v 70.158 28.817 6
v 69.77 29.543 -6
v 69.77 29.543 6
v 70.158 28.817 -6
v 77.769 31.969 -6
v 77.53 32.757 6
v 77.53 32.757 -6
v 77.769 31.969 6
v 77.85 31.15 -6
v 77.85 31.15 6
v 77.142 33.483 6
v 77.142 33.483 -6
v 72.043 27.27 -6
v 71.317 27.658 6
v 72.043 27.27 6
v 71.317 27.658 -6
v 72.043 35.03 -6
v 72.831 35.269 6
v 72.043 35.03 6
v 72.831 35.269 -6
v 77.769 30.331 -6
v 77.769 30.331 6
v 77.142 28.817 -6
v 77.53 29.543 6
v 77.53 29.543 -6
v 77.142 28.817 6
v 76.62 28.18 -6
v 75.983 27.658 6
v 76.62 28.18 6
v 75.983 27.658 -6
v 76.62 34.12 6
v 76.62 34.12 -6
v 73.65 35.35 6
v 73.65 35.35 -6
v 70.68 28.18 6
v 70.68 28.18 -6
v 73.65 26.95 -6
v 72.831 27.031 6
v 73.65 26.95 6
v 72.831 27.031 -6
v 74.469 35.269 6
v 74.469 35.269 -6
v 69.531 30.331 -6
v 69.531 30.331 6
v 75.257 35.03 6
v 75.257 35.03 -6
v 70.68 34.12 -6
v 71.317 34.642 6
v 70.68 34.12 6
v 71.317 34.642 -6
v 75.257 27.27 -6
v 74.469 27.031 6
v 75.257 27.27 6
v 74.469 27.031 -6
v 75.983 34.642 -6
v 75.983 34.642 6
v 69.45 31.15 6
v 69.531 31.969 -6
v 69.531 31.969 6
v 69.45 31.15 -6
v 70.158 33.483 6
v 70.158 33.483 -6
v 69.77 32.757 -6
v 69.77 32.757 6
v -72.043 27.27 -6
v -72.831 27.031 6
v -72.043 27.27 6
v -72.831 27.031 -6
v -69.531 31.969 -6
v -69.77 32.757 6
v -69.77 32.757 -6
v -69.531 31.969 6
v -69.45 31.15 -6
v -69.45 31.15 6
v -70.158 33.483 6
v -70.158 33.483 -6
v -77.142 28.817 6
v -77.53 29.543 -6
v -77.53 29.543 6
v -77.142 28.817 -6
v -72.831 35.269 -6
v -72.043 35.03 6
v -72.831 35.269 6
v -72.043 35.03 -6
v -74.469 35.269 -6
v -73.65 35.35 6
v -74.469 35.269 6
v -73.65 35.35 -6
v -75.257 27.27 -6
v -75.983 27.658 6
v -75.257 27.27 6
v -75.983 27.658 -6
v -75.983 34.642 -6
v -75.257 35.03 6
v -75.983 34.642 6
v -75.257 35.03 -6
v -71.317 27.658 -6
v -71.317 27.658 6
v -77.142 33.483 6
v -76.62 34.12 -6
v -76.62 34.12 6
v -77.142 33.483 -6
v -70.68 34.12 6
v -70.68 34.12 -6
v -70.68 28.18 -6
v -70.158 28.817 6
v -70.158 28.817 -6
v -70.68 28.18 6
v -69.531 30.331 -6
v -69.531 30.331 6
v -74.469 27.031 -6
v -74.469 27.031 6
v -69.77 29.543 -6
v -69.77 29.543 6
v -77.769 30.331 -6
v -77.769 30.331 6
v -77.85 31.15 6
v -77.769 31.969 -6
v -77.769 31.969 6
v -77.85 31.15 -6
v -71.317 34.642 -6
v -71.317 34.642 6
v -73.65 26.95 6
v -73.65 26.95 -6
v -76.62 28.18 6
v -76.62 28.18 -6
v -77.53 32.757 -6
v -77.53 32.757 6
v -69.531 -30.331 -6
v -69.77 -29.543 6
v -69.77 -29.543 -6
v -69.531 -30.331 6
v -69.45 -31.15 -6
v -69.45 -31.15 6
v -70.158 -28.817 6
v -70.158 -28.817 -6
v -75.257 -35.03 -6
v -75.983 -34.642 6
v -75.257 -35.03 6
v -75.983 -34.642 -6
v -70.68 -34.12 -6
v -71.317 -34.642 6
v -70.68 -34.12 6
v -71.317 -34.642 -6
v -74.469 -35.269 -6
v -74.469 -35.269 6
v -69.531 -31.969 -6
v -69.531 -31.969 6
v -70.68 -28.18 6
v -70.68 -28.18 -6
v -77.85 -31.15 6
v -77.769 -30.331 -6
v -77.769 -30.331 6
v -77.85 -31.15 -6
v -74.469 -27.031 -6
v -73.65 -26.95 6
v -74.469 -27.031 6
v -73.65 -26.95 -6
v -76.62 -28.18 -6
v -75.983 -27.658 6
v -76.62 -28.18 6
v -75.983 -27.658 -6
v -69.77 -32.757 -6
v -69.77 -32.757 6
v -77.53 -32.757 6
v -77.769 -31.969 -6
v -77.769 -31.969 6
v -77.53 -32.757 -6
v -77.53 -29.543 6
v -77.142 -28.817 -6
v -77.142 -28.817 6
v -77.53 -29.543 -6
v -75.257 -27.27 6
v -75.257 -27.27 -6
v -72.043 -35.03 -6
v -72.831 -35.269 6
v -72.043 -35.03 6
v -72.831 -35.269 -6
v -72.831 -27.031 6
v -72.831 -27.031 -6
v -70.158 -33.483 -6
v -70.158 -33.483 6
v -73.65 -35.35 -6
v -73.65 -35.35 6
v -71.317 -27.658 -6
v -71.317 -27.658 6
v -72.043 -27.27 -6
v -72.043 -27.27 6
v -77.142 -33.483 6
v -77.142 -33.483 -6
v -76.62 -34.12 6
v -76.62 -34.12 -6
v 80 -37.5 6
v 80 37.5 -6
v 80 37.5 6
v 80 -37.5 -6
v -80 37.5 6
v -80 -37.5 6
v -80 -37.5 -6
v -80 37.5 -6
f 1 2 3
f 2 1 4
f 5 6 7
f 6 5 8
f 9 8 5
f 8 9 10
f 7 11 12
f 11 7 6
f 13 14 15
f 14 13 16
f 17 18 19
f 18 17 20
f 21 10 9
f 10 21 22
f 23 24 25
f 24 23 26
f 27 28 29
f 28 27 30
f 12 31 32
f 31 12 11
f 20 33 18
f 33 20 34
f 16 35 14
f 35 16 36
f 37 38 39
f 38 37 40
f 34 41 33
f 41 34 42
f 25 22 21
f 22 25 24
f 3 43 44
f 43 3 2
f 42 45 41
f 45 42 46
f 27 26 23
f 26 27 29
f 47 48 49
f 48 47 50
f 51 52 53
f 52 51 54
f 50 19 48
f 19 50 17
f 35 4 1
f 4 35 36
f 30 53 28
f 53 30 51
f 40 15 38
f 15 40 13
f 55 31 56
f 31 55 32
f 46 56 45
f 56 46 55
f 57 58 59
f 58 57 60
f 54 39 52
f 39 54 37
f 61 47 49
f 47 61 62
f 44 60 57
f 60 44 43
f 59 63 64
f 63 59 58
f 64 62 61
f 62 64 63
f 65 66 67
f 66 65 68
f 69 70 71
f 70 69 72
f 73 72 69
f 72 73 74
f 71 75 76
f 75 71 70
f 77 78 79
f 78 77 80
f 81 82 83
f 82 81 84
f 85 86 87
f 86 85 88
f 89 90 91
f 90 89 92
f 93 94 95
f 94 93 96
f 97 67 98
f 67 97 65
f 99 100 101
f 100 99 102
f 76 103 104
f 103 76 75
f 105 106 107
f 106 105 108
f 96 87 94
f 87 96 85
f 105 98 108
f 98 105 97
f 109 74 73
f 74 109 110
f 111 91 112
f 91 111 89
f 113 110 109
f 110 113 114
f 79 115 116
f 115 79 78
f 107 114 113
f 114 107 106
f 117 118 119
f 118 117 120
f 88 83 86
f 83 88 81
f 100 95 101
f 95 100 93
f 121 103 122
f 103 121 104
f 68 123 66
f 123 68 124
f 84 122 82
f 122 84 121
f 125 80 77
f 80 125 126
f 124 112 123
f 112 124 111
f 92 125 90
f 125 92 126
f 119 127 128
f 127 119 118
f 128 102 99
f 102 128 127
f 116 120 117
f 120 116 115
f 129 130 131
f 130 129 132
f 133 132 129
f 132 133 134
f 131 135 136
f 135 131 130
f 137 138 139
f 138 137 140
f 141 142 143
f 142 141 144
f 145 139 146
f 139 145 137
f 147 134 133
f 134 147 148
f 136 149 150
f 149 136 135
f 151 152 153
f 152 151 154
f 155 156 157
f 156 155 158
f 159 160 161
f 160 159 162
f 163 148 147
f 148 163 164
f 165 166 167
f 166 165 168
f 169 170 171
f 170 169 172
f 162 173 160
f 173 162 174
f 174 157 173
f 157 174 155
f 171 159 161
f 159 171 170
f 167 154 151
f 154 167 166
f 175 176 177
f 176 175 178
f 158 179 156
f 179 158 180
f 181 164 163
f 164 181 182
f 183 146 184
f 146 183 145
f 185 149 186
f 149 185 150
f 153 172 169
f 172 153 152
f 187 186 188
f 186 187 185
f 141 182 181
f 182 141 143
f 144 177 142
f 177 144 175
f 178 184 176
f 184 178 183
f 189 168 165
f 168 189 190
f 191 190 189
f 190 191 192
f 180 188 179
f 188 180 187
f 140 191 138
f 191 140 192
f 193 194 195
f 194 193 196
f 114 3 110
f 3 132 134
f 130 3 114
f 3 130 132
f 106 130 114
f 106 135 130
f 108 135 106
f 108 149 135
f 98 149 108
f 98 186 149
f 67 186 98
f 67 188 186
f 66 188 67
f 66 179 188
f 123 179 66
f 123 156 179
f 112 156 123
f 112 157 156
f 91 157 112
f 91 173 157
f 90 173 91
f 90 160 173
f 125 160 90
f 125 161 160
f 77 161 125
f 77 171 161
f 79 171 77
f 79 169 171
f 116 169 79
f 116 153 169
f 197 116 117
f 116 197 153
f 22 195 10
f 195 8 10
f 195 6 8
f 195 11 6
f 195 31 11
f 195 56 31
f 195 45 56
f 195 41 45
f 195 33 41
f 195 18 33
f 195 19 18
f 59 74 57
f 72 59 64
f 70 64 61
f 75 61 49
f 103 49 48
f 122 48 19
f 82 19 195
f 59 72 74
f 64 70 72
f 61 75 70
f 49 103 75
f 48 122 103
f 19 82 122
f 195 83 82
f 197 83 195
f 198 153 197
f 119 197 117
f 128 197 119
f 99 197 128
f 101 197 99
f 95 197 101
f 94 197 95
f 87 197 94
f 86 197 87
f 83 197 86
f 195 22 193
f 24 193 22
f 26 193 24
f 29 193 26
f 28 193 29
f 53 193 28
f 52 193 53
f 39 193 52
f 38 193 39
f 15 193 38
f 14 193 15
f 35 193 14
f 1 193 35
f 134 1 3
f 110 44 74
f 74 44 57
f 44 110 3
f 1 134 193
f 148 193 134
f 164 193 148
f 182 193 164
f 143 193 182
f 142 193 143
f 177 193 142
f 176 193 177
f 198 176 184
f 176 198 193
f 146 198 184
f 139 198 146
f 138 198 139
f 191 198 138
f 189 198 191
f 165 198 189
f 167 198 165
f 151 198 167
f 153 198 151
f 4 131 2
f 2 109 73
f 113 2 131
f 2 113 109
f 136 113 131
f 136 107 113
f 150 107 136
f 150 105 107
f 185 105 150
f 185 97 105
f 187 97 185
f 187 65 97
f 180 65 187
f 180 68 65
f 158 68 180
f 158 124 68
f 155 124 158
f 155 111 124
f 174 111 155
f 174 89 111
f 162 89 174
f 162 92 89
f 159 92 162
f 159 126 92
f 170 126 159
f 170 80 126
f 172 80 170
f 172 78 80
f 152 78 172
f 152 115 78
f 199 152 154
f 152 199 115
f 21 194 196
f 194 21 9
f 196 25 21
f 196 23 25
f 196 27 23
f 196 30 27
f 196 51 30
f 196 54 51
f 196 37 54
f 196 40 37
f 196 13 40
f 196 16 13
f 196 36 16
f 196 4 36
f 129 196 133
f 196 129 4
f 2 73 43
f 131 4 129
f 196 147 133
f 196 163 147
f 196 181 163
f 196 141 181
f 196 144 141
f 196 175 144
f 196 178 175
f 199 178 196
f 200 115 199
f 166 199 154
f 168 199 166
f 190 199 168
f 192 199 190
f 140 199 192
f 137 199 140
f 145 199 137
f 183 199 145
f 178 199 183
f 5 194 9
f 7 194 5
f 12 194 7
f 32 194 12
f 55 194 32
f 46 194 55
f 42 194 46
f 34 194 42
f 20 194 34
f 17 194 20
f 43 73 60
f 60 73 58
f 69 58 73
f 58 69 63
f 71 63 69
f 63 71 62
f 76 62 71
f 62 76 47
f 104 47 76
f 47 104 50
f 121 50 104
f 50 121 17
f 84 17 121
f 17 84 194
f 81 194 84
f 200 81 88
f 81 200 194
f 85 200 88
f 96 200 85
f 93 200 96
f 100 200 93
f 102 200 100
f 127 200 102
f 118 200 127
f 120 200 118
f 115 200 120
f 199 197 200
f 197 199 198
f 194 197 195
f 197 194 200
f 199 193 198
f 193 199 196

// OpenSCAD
$fn = 32;

// ----------------------------------------------------------------------
// Corner plate 160 x 75 x 12
// 3 holes, centres taken from the edge offset
// ----------------------------------------------------------------------

// --- parameters (mm) ---
plate = [160, 75, 12];  // overall size (x, y, z)
holes = 3;              // number of holes the drawing asks for
hole_d = 8.4;           // hole diameter
edge = 6.35;            // hole centre offset from the plate edge

// --- derived feature positions (mm) ---
corner_x = plate[0] / 2 - edge;  // = 73.65   corner hole X
corner_y = plate[1] / 2 - edge;  // = 31.15   corner hole Y
feature_centers = [
  [corner_x, corner_y],
  [-corner_x, corner_y],
  [-corner_x, -corner_y]
];   // hole centres the loop below drills

// plate outline, every hole drilled through with the same cutters
difference() {
  cube(plate, center = true);
  for (centre = feature_centers)
    translate([centre[0], centre[1], 0])
      cylinder(d = hole_d, h = plate[2] + 2, center = true);
}
